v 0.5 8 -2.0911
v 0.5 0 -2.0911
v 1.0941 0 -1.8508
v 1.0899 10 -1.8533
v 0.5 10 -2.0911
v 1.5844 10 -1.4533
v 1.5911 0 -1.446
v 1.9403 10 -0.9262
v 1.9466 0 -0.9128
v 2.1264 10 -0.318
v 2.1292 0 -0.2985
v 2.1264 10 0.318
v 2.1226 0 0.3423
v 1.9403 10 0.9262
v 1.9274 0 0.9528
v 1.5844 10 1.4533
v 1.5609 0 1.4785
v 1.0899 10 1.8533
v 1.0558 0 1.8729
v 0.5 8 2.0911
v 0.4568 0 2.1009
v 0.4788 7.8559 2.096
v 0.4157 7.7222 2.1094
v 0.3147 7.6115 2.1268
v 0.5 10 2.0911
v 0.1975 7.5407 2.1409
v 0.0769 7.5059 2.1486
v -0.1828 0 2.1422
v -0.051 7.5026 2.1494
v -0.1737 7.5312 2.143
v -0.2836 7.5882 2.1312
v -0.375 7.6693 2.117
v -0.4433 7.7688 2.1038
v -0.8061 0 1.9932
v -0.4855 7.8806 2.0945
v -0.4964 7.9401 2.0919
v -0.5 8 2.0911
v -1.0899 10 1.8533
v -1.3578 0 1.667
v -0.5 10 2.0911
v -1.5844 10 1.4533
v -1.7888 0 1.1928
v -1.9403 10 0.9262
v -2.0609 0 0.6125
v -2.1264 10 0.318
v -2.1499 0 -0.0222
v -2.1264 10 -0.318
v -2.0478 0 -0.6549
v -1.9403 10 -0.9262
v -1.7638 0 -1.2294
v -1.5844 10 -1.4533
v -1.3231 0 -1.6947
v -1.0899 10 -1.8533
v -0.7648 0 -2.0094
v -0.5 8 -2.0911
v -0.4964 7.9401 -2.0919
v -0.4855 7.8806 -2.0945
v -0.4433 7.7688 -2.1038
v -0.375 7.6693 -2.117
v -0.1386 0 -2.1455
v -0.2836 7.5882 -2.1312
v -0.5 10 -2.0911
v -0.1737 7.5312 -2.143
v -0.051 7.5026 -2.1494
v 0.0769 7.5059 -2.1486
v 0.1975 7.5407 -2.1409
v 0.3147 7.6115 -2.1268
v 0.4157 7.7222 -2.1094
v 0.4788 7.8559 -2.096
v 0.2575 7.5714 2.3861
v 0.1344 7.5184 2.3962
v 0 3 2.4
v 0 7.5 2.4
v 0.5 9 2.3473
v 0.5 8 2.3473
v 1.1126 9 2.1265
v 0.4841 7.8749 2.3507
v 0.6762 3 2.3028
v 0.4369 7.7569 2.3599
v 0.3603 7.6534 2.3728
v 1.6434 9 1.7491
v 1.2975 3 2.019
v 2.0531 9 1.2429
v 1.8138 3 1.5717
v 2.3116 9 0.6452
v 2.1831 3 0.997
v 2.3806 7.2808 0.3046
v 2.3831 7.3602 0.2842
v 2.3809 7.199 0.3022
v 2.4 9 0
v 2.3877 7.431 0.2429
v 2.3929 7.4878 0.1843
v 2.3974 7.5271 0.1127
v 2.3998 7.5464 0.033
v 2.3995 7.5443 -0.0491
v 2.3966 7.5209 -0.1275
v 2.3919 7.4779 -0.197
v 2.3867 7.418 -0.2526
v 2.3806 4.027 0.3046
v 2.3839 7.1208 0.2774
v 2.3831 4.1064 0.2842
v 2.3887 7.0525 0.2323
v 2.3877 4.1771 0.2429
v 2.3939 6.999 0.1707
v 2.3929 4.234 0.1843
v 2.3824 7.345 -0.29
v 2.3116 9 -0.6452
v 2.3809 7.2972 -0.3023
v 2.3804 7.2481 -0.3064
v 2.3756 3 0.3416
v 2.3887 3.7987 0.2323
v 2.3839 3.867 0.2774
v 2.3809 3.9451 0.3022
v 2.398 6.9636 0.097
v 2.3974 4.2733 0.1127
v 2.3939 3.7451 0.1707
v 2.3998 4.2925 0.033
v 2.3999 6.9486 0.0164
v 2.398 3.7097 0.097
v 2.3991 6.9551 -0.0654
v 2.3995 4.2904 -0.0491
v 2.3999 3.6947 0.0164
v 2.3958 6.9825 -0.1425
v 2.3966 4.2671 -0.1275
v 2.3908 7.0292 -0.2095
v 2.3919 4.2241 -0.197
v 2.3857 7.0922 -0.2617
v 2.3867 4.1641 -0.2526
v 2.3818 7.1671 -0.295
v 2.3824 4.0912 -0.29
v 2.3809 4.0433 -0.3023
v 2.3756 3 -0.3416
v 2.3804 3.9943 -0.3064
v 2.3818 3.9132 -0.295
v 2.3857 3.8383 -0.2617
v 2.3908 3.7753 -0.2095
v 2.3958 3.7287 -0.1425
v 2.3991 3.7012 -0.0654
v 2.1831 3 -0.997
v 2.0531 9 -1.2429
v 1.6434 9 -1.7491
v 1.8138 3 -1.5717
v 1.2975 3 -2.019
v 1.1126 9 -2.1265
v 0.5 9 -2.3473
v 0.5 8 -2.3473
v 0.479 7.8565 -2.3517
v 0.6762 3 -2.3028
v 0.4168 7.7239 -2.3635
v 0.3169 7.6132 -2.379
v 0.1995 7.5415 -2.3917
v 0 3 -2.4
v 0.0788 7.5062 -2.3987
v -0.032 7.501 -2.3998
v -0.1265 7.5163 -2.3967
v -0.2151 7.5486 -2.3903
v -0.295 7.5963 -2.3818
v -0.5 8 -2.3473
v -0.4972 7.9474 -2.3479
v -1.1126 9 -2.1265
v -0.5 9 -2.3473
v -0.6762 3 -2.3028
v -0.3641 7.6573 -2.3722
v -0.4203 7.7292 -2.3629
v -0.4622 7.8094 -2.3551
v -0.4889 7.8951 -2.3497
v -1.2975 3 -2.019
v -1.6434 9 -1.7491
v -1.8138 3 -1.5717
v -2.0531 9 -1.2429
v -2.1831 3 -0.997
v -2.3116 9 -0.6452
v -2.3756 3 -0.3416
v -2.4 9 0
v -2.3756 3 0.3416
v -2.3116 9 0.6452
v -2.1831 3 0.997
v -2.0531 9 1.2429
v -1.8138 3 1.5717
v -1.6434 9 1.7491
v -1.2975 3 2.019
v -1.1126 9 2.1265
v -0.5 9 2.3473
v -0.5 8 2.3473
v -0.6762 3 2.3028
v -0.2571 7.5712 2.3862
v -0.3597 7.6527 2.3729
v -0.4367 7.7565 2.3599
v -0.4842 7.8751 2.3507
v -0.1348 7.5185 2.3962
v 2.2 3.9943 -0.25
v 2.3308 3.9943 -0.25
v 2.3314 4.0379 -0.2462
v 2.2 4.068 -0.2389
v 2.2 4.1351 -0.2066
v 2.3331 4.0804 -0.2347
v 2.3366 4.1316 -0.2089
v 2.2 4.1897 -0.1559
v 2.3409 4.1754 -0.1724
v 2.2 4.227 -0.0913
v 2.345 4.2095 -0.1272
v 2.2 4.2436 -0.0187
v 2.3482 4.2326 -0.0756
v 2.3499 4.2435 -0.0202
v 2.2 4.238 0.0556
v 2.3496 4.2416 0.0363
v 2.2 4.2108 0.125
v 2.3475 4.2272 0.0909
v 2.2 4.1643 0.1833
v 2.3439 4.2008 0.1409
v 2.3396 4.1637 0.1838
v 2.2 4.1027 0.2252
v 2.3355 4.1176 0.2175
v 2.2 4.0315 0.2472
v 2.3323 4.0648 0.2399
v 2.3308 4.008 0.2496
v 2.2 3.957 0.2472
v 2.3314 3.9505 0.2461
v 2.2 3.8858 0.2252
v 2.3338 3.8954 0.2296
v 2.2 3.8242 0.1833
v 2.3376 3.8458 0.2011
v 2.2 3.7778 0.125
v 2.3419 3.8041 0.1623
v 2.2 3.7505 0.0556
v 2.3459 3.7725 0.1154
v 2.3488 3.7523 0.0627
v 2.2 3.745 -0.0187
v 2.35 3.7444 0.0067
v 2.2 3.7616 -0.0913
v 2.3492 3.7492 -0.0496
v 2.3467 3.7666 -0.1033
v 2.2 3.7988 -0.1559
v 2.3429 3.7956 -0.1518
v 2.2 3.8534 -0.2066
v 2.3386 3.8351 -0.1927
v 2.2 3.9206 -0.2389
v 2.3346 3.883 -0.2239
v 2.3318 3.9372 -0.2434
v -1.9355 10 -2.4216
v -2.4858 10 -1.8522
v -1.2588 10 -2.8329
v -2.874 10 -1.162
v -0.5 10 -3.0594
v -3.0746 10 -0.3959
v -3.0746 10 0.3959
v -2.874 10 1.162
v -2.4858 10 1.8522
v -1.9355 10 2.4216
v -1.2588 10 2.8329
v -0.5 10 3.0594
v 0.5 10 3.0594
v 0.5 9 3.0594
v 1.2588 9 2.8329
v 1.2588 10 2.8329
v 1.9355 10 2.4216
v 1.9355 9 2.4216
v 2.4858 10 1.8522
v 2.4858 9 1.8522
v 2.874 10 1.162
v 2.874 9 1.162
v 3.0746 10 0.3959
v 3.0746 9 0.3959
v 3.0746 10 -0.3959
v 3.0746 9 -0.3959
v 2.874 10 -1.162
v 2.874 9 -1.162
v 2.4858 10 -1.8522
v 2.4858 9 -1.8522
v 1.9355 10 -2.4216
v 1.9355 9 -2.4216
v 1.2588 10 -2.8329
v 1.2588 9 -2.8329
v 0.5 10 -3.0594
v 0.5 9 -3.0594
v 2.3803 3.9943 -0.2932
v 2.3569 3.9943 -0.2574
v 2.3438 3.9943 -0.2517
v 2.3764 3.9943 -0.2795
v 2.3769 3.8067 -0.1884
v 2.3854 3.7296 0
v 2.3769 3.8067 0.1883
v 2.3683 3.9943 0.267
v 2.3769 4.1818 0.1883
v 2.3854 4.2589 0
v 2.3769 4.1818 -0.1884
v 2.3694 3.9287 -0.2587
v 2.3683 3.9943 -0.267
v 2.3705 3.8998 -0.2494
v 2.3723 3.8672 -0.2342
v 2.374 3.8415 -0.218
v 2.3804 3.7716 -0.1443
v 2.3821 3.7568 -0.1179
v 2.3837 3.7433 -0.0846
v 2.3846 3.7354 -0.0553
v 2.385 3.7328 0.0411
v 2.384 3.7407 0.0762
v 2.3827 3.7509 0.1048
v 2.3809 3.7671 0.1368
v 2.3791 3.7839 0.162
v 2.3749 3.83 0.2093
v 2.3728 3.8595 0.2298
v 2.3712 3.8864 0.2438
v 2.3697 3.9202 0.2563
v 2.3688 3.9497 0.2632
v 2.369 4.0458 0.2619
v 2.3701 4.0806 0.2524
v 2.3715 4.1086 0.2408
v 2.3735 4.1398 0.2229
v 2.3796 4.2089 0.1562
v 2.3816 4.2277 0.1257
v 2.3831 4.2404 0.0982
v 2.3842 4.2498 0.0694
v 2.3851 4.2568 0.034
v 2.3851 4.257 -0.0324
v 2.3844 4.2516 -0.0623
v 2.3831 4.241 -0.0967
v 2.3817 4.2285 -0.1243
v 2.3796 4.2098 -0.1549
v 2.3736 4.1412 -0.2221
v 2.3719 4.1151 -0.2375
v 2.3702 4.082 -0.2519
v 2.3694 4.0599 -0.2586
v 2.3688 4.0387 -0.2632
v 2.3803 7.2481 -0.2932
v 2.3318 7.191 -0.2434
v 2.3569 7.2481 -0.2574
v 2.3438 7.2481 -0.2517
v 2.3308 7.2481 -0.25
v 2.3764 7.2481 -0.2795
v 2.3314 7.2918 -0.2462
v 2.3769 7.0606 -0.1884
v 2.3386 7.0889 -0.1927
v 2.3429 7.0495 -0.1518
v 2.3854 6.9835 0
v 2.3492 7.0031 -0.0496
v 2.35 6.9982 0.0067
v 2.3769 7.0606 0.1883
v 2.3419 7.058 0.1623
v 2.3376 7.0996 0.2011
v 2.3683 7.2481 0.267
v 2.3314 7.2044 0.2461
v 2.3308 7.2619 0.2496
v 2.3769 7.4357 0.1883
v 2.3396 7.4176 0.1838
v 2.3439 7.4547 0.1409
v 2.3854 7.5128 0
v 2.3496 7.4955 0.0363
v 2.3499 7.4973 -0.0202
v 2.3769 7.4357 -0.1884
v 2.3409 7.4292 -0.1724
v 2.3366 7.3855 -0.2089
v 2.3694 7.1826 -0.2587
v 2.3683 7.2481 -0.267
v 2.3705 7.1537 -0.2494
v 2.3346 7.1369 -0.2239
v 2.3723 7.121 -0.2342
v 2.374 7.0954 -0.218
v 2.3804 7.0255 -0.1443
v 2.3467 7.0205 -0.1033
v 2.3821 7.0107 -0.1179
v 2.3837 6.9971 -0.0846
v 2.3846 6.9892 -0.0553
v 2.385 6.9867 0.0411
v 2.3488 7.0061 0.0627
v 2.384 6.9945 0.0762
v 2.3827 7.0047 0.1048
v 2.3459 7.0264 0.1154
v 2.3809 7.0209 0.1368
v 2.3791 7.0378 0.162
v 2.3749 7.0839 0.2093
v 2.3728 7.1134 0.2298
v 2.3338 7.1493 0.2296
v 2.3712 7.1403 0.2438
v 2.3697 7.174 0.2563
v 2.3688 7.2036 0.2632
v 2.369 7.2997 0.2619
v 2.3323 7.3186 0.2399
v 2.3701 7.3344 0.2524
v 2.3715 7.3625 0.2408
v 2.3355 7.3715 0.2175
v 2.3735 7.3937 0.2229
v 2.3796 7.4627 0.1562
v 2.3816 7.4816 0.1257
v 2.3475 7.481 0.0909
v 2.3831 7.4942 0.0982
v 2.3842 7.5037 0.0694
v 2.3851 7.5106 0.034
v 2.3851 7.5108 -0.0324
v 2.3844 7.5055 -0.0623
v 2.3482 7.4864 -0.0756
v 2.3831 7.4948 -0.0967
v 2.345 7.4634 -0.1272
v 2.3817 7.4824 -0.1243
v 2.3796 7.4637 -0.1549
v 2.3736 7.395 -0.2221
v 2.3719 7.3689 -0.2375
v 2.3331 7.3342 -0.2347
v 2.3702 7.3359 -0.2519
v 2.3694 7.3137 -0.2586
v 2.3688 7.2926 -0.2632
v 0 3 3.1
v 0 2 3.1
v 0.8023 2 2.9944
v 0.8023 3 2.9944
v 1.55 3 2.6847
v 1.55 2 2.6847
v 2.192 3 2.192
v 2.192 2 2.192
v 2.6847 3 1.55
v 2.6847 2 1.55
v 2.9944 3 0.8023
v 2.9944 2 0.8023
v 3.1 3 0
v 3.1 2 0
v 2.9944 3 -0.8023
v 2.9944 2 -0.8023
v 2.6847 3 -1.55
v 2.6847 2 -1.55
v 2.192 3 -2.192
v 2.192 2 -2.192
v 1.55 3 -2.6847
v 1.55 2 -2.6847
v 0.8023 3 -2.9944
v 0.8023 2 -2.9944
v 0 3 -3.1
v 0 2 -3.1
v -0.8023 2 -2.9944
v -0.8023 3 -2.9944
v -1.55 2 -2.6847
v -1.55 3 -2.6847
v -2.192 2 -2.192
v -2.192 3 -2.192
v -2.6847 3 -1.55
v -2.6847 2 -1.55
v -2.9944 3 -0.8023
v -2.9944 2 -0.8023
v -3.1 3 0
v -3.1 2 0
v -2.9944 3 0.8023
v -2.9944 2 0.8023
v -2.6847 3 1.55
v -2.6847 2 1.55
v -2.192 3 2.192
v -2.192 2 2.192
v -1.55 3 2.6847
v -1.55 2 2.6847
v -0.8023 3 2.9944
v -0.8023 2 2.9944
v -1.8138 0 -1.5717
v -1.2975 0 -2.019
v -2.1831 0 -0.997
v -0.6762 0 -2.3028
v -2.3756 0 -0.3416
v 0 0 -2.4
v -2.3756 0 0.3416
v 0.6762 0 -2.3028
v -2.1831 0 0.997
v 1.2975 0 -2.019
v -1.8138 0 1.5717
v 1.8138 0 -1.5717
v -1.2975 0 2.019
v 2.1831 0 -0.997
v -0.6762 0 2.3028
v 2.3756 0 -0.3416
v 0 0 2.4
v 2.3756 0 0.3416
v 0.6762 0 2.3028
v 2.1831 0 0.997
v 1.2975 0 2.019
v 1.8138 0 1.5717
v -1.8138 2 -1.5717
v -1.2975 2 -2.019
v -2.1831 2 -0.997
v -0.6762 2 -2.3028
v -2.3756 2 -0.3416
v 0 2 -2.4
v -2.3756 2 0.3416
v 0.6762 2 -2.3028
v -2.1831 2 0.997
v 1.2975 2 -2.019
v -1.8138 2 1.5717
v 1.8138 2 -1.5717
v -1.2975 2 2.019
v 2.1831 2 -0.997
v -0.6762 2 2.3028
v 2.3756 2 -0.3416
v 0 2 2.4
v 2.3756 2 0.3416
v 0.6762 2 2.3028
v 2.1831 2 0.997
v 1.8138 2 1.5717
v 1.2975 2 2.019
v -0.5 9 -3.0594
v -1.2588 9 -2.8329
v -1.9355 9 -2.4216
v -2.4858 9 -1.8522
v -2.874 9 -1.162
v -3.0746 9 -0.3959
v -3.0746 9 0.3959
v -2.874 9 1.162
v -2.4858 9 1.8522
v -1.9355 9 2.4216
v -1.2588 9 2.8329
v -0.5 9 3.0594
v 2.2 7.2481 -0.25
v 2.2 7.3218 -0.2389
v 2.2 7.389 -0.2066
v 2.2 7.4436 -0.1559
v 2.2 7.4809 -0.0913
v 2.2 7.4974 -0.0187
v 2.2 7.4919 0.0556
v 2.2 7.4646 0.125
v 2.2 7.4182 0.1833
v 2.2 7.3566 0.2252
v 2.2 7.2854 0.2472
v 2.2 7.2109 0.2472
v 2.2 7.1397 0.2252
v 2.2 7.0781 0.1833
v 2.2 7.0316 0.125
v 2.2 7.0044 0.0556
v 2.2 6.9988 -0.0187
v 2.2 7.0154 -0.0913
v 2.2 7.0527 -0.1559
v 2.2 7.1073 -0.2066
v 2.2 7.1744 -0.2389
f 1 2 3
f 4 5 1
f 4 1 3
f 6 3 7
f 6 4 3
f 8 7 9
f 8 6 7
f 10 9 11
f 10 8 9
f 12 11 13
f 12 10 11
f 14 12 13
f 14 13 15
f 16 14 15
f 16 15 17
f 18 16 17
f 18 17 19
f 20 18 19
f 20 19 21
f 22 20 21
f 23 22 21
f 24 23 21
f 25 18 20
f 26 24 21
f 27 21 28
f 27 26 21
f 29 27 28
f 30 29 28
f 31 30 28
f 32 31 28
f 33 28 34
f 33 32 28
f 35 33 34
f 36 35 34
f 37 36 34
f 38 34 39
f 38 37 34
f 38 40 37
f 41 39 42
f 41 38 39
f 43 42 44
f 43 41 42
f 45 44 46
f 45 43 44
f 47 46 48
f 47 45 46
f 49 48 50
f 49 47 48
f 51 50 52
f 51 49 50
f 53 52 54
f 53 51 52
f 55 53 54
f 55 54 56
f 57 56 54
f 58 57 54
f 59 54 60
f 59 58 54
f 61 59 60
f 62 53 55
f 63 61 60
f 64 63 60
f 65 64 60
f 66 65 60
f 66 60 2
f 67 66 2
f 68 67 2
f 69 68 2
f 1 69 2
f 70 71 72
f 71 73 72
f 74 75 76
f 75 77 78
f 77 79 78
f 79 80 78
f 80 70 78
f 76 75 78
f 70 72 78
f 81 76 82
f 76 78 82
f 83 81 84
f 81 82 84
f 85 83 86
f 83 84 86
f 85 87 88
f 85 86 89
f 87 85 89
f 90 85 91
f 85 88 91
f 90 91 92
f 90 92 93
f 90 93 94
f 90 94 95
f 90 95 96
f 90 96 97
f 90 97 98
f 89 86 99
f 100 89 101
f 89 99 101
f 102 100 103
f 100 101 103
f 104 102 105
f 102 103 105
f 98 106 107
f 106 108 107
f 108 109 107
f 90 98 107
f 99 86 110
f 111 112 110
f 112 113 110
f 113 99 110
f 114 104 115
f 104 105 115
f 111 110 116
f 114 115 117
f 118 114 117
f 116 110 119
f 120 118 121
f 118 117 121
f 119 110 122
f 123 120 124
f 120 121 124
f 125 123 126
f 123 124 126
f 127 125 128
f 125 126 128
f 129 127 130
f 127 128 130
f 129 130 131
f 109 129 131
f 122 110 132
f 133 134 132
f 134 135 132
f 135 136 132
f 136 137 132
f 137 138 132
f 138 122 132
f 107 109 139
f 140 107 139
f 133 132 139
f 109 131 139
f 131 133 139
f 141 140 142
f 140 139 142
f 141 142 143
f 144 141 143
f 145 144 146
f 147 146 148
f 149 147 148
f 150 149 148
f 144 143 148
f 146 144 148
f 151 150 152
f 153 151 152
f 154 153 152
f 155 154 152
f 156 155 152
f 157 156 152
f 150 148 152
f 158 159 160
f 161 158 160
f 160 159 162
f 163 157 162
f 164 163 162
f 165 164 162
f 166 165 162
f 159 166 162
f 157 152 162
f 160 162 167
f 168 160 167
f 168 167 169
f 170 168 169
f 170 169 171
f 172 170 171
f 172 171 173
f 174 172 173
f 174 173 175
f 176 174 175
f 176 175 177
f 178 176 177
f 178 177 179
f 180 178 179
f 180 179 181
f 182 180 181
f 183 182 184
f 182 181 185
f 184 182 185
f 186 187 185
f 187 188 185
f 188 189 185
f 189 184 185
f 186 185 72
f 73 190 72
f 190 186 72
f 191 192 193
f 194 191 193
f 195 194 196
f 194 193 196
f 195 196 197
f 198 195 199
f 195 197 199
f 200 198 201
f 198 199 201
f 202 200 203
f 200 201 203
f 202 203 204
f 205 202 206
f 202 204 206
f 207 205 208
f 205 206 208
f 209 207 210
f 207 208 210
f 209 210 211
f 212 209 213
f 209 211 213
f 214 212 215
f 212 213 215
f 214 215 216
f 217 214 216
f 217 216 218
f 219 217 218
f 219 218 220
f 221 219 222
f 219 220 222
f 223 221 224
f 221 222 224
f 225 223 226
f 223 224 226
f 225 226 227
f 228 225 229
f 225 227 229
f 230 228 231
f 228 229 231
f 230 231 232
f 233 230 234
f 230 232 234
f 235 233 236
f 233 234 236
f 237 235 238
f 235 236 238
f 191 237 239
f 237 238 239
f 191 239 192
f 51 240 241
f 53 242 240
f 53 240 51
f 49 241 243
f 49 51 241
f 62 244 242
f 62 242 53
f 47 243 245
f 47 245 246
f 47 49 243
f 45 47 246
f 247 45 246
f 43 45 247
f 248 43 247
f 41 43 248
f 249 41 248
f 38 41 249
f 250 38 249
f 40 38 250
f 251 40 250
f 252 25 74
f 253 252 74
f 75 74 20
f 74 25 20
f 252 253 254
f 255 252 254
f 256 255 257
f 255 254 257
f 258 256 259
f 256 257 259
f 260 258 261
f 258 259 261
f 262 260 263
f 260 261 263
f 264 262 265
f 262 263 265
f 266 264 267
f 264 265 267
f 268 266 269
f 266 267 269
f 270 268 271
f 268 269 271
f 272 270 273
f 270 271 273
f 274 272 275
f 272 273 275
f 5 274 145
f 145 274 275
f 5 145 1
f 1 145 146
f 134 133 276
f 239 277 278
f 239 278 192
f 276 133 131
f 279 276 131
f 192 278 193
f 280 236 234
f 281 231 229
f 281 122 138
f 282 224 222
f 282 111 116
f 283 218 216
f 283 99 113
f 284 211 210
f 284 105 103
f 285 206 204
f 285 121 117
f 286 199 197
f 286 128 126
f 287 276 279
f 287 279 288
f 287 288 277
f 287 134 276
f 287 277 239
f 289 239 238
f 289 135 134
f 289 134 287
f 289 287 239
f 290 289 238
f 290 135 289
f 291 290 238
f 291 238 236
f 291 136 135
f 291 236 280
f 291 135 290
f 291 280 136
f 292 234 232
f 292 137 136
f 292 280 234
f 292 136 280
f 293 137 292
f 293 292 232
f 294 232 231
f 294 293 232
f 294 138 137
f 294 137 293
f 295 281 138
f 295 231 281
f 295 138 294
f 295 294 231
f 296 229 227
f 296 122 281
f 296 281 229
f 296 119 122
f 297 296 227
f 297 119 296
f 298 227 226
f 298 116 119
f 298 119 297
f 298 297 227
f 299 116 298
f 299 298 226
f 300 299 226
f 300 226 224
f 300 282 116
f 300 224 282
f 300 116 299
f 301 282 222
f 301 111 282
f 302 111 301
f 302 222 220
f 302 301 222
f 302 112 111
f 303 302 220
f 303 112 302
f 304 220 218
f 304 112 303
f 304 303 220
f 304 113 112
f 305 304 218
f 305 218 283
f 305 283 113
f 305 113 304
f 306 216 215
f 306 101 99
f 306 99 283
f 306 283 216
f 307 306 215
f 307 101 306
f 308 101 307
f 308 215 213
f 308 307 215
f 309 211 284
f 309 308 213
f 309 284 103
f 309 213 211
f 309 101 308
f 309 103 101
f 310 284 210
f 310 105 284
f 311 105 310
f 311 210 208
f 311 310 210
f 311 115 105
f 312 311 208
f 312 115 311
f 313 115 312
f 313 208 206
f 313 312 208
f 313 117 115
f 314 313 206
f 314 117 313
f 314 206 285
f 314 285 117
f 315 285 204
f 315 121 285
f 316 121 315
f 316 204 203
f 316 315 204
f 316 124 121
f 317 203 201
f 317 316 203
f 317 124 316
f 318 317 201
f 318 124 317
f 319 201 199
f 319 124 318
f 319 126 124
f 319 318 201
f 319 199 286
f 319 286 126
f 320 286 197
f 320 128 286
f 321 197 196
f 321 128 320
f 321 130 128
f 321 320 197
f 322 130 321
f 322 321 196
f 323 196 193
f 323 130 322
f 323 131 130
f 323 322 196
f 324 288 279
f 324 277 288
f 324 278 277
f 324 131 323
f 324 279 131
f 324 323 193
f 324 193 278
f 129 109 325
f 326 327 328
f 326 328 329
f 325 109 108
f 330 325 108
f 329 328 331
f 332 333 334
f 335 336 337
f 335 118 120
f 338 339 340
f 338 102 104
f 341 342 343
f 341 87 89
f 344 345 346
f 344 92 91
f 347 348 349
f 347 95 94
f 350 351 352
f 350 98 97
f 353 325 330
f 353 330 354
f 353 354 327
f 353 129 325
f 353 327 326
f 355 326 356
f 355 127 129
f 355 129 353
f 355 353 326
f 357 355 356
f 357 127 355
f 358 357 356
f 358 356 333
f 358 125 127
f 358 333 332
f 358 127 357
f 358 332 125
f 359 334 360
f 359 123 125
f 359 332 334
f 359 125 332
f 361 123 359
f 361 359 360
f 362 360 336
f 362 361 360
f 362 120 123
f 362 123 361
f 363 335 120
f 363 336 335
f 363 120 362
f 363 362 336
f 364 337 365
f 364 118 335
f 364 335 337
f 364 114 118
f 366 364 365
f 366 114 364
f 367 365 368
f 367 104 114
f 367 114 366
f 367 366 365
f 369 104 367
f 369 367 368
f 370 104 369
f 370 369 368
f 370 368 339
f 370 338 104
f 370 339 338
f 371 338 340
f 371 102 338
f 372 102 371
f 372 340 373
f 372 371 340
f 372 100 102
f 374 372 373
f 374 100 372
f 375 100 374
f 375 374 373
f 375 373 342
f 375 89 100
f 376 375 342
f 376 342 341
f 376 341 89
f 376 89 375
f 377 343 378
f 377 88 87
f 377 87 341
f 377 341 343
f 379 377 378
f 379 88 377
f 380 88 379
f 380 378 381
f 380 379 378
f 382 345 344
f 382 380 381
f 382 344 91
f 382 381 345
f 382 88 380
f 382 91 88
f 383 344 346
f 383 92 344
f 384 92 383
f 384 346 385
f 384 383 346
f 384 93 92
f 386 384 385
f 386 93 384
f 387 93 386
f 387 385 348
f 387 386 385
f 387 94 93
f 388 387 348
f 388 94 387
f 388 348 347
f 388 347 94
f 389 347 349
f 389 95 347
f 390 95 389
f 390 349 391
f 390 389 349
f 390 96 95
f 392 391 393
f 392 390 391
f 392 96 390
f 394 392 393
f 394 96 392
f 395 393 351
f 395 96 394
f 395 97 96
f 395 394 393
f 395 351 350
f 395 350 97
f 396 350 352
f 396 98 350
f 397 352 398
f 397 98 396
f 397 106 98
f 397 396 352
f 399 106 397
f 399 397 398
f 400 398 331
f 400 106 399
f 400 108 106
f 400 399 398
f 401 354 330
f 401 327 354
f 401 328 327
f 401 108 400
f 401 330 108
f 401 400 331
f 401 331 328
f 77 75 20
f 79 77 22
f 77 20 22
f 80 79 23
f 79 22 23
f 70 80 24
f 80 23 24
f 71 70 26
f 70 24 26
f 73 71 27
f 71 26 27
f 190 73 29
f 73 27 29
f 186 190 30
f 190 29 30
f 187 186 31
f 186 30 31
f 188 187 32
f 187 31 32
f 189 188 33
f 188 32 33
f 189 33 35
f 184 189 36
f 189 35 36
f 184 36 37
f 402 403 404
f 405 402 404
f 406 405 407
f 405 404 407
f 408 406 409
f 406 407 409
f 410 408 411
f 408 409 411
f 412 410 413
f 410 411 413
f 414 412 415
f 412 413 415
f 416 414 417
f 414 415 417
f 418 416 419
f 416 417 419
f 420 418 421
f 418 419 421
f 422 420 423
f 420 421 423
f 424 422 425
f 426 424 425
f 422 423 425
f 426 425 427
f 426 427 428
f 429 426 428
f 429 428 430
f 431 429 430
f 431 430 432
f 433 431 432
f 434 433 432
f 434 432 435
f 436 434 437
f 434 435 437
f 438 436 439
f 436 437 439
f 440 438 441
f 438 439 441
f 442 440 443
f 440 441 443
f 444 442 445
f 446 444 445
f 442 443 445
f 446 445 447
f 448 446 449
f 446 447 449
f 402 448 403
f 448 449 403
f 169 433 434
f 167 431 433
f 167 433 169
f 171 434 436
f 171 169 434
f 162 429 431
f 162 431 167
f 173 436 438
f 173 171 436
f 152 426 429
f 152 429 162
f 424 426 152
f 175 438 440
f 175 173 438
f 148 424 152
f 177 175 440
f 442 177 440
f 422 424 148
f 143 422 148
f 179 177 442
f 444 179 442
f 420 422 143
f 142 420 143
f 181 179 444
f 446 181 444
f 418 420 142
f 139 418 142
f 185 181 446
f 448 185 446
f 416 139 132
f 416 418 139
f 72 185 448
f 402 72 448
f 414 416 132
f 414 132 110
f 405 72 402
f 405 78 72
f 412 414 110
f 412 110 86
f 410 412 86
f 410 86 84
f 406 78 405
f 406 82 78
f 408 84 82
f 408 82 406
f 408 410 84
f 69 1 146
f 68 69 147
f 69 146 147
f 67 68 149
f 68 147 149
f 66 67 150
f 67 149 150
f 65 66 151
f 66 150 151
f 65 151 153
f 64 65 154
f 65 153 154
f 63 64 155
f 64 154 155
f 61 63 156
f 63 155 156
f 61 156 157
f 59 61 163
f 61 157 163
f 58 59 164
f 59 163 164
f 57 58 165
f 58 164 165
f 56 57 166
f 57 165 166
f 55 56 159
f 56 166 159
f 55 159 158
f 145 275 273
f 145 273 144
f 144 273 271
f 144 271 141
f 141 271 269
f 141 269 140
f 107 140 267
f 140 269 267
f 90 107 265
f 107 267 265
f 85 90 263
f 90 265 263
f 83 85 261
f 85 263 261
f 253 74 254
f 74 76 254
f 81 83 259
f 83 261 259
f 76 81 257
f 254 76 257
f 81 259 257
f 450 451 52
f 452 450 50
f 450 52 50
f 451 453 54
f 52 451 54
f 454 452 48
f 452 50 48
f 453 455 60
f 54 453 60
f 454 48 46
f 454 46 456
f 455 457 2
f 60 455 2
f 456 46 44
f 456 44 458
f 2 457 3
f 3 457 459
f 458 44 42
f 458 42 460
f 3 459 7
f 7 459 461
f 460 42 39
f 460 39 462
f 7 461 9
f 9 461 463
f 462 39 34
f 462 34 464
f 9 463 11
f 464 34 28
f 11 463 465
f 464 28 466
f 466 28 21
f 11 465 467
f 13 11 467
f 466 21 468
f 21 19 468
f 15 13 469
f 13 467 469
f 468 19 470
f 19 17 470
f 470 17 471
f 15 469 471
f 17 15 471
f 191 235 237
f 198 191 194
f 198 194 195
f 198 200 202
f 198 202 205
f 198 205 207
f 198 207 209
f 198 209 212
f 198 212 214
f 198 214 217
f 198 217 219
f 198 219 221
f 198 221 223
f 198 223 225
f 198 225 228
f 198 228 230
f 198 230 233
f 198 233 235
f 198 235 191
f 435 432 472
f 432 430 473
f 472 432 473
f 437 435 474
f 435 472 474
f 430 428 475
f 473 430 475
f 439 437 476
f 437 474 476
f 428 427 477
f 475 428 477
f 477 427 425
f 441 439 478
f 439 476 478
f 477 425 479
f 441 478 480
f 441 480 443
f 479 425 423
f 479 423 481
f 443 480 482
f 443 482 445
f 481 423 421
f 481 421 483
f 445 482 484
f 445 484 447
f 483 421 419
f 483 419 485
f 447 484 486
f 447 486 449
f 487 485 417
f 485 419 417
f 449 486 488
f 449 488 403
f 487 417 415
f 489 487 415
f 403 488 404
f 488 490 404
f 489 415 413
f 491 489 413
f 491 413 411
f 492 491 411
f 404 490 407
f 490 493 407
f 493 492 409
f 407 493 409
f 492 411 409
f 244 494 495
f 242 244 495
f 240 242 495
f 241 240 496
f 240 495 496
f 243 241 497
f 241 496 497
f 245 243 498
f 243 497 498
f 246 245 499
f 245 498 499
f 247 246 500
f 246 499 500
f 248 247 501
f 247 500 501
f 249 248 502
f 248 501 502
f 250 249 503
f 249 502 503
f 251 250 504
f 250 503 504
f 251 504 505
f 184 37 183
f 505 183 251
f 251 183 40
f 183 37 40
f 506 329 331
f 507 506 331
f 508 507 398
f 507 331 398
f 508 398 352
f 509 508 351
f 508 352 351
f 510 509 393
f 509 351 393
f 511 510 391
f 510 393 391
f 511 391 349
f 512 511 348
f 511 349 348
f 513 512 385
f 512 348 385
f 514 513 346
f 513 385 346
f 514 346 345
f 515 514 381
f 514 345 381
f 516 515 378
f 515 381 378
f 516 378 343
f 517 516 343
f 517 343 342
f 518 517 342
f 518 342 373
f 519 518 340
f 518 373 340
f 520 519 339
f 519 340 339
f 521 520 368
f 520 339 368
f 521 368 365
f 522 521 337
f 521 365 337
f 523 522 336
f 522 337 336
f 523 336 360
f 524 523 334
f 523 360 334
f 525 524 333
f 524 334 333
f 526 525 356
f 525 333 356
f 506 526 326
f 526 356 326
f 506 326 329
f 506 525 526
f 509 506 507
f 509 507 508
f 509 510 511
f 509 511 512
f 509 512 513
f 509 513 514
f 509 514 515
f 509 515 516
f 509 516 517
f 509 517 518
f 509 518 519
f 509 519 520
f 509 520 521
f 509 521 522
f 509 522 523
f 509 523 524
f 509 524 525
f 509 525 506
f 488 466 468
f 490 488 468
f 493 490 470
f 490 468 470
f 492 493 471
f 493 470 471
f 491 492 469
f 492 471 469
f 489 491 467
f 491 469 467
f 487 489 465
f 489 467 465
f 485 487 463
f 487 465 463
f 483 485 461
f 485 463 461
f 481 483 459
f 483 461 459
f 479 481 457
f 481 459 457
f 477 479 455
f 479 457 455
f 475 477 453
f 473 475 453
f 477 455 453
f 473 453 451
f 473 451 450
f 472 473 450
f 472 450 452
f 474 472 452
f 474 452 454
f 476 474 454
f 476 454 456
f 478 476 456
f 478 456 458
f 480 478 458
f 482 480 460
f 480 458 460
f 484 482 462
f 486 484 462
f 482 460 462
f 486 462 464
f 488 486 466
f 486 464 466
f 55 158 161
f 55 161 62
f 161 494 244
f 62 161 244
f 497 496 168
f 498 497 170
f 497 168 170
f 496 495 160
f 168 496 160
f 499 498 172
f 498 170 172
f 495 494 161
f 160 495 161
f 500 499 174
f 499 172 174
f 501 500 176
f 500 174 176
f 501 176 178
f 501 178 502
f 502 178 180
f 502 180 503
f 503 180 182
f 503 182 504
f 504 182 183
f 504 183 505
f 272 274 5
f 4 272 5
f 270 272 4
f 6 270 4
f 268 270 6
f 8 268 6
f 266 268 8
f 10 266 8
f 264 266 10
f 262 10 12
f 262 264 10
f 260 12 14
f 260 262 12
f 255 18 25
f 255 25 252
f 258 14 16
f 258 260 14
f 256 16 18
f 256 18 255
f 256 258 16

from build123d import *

# Parameters (mm, degrees)
SKETCH2_R               = 2.4
BOSS_EXTRUDE1_DEPTH     = 2
SKETCH3_R               = 3.1
BOSS_EXTRUDE2_DEPTH     = 1
SKETCH4_R               = 2.4
BOSS_EXTRUDE3_DEPTH     = 6
SKETCH5_R               = 3.1
BOSS_EXTRUDE4_DEPTH     = 1
CUT_EXTRUDE1_DEPTH      = 11.918791142
CUT_EXTRUDE1_DEPTH_BACK = 11.918791142
SKETCH7_R               = 0.25
CUT_EXTRUDE2_DEPTH      = 0.2
FILLET1_R               = 0.05
FILLET2_R               = 0.05
CUT_EXTRUDE3_DEPTH      = 11.918791142
CUT_EXTRUDE3_DEPTH_BACK = 11.918791142
SKETCH9_R               = 2.15


with BuildPart() as part:
    # Sketch2 → Boss-Extrude1 (new body)
    with BuildSketch(Plane(origin=(0, 0, 0), x_dir=(1, 0, 0), z_dir=(0, 1, 0))):
        with Locations(Location((0, 0, 0), (0, 0, 270))):
            Circle(SKETCH2_R)
    extrude(amount=BOSS_EXTRUDE1_DEPTH)

    # Sketch3 → Boss-Extrude2 (add)
    with BuildSketch(Plane(origin=(0, 2, 0), x_dir=(1, 0, 0), z_dir=(0, 1, 0))):
        with Locations(Location((0, 0, 0), (0, 0, 270))):
            Circle(SKETCH3_R)
    extrude(amount=BOSS_EXTRUDE2_DEPTH)

    # Sketch4 → Boss-Extrude3 (add)
    with BuildSketch(Plane(origin=(0, 3, 0), x_dir=(1, 0, 0), z_dir=(0, 1, 0))):
        with Locations(Location((0, 0, 0), (0, 0, 270))):
            Circle(SKETCH4_R)
    extrude(amount=BOSS_EXTRUDE3_DEPTH)

    # Sketch5 → Boss-Extrude4 (add)
    with BuildSketch(Plane(origin=(0, 9, 0), x_dir=(1, 0, 0), z_dir=(0, 1, 0))):
        with Locations(Location((0, 0, 0), (0, 0, 270))):
            Circle(SKETCH5_R)
    extrude(amount=BOSS_EXTRUDE4_DEPTH)

    # Sketch6 → Cut-Extrude1 (cut, two sides: drawn at the far end of the back side and taken through both)
    with BuildSketch(Plane.XY.offset(-CUT_EXTRUDE1_DEPTH_BACK)):
        with BuildLine():
            Line((0.5, 10), (0.5, 8))
            ThreePointArc((0.5, 8), (0, 7.5), (-0.5, 8))
            Line((-0.5, 8), (-0.5, 10))
            ThreePointArc((-0.5, 10), (0, 10.5), (0.5, 10))
        make_face()
    extrude(amount=CUT_EXTRUDE1_DEPTH + CUT_EXTRUDE1_DEPTH_BACK, mode=Mode.SUBTRACT)

    # Sketch7 → Cut-Extrude2 (cut)
    with BuildSketch(Plane(origin=(2.4, 0, 0), x_dir=(0, 0, -1), z_dir=(1, 0, 0))):
        with Locations((0, 7.248136305)):
            Circle(SKETCH7_R)
        with Locations((0, 3.994273363)):
            Circle(SKETCH7_R)
    extrude(amount=-CUT_EXTRUDE2_DEPTH, mode=Mode.SUBTRACT)

    # Fillet1
    fillet1_edges = [part.edges().sort_by_distance(p)[0] for p in [
        (2.386943652, 7.248136305, 0.25),
    ]]
    fillet(fillet1_edges, radius=FILLET1_R)

    # Fillet2
    fillet2_edges = [part.edges().sort_by_distance(p)[0] for p in [
        (2.386943652, 3.994273363, 0.25),
    ]]
    fillet(fillet2_edges, radius=FILLET2_R)

    # Sketch9 → Cut-Extrude3 (cut, two sides: drawn at the far end of the back side and taken through both)
    with BuildSketch(Plane(origin=(0, 0, 0), x_dir=(-1, 0, 0), z_dir=(0, -1, 0)).offset(-CUT_EXTRUDE3_DEPTH_BACK)):
        with Locations(Location((0, 0, 0), (0, 0, 103.447727045))):
            Circle(SKETCH9_R)
    extrude(amount=CUT_EXTRUDE3_DEPTH + CUT_EXTRUDE3_DEPTH_BACK, mode=Mode.SUBTRACT)


solid = part.part
